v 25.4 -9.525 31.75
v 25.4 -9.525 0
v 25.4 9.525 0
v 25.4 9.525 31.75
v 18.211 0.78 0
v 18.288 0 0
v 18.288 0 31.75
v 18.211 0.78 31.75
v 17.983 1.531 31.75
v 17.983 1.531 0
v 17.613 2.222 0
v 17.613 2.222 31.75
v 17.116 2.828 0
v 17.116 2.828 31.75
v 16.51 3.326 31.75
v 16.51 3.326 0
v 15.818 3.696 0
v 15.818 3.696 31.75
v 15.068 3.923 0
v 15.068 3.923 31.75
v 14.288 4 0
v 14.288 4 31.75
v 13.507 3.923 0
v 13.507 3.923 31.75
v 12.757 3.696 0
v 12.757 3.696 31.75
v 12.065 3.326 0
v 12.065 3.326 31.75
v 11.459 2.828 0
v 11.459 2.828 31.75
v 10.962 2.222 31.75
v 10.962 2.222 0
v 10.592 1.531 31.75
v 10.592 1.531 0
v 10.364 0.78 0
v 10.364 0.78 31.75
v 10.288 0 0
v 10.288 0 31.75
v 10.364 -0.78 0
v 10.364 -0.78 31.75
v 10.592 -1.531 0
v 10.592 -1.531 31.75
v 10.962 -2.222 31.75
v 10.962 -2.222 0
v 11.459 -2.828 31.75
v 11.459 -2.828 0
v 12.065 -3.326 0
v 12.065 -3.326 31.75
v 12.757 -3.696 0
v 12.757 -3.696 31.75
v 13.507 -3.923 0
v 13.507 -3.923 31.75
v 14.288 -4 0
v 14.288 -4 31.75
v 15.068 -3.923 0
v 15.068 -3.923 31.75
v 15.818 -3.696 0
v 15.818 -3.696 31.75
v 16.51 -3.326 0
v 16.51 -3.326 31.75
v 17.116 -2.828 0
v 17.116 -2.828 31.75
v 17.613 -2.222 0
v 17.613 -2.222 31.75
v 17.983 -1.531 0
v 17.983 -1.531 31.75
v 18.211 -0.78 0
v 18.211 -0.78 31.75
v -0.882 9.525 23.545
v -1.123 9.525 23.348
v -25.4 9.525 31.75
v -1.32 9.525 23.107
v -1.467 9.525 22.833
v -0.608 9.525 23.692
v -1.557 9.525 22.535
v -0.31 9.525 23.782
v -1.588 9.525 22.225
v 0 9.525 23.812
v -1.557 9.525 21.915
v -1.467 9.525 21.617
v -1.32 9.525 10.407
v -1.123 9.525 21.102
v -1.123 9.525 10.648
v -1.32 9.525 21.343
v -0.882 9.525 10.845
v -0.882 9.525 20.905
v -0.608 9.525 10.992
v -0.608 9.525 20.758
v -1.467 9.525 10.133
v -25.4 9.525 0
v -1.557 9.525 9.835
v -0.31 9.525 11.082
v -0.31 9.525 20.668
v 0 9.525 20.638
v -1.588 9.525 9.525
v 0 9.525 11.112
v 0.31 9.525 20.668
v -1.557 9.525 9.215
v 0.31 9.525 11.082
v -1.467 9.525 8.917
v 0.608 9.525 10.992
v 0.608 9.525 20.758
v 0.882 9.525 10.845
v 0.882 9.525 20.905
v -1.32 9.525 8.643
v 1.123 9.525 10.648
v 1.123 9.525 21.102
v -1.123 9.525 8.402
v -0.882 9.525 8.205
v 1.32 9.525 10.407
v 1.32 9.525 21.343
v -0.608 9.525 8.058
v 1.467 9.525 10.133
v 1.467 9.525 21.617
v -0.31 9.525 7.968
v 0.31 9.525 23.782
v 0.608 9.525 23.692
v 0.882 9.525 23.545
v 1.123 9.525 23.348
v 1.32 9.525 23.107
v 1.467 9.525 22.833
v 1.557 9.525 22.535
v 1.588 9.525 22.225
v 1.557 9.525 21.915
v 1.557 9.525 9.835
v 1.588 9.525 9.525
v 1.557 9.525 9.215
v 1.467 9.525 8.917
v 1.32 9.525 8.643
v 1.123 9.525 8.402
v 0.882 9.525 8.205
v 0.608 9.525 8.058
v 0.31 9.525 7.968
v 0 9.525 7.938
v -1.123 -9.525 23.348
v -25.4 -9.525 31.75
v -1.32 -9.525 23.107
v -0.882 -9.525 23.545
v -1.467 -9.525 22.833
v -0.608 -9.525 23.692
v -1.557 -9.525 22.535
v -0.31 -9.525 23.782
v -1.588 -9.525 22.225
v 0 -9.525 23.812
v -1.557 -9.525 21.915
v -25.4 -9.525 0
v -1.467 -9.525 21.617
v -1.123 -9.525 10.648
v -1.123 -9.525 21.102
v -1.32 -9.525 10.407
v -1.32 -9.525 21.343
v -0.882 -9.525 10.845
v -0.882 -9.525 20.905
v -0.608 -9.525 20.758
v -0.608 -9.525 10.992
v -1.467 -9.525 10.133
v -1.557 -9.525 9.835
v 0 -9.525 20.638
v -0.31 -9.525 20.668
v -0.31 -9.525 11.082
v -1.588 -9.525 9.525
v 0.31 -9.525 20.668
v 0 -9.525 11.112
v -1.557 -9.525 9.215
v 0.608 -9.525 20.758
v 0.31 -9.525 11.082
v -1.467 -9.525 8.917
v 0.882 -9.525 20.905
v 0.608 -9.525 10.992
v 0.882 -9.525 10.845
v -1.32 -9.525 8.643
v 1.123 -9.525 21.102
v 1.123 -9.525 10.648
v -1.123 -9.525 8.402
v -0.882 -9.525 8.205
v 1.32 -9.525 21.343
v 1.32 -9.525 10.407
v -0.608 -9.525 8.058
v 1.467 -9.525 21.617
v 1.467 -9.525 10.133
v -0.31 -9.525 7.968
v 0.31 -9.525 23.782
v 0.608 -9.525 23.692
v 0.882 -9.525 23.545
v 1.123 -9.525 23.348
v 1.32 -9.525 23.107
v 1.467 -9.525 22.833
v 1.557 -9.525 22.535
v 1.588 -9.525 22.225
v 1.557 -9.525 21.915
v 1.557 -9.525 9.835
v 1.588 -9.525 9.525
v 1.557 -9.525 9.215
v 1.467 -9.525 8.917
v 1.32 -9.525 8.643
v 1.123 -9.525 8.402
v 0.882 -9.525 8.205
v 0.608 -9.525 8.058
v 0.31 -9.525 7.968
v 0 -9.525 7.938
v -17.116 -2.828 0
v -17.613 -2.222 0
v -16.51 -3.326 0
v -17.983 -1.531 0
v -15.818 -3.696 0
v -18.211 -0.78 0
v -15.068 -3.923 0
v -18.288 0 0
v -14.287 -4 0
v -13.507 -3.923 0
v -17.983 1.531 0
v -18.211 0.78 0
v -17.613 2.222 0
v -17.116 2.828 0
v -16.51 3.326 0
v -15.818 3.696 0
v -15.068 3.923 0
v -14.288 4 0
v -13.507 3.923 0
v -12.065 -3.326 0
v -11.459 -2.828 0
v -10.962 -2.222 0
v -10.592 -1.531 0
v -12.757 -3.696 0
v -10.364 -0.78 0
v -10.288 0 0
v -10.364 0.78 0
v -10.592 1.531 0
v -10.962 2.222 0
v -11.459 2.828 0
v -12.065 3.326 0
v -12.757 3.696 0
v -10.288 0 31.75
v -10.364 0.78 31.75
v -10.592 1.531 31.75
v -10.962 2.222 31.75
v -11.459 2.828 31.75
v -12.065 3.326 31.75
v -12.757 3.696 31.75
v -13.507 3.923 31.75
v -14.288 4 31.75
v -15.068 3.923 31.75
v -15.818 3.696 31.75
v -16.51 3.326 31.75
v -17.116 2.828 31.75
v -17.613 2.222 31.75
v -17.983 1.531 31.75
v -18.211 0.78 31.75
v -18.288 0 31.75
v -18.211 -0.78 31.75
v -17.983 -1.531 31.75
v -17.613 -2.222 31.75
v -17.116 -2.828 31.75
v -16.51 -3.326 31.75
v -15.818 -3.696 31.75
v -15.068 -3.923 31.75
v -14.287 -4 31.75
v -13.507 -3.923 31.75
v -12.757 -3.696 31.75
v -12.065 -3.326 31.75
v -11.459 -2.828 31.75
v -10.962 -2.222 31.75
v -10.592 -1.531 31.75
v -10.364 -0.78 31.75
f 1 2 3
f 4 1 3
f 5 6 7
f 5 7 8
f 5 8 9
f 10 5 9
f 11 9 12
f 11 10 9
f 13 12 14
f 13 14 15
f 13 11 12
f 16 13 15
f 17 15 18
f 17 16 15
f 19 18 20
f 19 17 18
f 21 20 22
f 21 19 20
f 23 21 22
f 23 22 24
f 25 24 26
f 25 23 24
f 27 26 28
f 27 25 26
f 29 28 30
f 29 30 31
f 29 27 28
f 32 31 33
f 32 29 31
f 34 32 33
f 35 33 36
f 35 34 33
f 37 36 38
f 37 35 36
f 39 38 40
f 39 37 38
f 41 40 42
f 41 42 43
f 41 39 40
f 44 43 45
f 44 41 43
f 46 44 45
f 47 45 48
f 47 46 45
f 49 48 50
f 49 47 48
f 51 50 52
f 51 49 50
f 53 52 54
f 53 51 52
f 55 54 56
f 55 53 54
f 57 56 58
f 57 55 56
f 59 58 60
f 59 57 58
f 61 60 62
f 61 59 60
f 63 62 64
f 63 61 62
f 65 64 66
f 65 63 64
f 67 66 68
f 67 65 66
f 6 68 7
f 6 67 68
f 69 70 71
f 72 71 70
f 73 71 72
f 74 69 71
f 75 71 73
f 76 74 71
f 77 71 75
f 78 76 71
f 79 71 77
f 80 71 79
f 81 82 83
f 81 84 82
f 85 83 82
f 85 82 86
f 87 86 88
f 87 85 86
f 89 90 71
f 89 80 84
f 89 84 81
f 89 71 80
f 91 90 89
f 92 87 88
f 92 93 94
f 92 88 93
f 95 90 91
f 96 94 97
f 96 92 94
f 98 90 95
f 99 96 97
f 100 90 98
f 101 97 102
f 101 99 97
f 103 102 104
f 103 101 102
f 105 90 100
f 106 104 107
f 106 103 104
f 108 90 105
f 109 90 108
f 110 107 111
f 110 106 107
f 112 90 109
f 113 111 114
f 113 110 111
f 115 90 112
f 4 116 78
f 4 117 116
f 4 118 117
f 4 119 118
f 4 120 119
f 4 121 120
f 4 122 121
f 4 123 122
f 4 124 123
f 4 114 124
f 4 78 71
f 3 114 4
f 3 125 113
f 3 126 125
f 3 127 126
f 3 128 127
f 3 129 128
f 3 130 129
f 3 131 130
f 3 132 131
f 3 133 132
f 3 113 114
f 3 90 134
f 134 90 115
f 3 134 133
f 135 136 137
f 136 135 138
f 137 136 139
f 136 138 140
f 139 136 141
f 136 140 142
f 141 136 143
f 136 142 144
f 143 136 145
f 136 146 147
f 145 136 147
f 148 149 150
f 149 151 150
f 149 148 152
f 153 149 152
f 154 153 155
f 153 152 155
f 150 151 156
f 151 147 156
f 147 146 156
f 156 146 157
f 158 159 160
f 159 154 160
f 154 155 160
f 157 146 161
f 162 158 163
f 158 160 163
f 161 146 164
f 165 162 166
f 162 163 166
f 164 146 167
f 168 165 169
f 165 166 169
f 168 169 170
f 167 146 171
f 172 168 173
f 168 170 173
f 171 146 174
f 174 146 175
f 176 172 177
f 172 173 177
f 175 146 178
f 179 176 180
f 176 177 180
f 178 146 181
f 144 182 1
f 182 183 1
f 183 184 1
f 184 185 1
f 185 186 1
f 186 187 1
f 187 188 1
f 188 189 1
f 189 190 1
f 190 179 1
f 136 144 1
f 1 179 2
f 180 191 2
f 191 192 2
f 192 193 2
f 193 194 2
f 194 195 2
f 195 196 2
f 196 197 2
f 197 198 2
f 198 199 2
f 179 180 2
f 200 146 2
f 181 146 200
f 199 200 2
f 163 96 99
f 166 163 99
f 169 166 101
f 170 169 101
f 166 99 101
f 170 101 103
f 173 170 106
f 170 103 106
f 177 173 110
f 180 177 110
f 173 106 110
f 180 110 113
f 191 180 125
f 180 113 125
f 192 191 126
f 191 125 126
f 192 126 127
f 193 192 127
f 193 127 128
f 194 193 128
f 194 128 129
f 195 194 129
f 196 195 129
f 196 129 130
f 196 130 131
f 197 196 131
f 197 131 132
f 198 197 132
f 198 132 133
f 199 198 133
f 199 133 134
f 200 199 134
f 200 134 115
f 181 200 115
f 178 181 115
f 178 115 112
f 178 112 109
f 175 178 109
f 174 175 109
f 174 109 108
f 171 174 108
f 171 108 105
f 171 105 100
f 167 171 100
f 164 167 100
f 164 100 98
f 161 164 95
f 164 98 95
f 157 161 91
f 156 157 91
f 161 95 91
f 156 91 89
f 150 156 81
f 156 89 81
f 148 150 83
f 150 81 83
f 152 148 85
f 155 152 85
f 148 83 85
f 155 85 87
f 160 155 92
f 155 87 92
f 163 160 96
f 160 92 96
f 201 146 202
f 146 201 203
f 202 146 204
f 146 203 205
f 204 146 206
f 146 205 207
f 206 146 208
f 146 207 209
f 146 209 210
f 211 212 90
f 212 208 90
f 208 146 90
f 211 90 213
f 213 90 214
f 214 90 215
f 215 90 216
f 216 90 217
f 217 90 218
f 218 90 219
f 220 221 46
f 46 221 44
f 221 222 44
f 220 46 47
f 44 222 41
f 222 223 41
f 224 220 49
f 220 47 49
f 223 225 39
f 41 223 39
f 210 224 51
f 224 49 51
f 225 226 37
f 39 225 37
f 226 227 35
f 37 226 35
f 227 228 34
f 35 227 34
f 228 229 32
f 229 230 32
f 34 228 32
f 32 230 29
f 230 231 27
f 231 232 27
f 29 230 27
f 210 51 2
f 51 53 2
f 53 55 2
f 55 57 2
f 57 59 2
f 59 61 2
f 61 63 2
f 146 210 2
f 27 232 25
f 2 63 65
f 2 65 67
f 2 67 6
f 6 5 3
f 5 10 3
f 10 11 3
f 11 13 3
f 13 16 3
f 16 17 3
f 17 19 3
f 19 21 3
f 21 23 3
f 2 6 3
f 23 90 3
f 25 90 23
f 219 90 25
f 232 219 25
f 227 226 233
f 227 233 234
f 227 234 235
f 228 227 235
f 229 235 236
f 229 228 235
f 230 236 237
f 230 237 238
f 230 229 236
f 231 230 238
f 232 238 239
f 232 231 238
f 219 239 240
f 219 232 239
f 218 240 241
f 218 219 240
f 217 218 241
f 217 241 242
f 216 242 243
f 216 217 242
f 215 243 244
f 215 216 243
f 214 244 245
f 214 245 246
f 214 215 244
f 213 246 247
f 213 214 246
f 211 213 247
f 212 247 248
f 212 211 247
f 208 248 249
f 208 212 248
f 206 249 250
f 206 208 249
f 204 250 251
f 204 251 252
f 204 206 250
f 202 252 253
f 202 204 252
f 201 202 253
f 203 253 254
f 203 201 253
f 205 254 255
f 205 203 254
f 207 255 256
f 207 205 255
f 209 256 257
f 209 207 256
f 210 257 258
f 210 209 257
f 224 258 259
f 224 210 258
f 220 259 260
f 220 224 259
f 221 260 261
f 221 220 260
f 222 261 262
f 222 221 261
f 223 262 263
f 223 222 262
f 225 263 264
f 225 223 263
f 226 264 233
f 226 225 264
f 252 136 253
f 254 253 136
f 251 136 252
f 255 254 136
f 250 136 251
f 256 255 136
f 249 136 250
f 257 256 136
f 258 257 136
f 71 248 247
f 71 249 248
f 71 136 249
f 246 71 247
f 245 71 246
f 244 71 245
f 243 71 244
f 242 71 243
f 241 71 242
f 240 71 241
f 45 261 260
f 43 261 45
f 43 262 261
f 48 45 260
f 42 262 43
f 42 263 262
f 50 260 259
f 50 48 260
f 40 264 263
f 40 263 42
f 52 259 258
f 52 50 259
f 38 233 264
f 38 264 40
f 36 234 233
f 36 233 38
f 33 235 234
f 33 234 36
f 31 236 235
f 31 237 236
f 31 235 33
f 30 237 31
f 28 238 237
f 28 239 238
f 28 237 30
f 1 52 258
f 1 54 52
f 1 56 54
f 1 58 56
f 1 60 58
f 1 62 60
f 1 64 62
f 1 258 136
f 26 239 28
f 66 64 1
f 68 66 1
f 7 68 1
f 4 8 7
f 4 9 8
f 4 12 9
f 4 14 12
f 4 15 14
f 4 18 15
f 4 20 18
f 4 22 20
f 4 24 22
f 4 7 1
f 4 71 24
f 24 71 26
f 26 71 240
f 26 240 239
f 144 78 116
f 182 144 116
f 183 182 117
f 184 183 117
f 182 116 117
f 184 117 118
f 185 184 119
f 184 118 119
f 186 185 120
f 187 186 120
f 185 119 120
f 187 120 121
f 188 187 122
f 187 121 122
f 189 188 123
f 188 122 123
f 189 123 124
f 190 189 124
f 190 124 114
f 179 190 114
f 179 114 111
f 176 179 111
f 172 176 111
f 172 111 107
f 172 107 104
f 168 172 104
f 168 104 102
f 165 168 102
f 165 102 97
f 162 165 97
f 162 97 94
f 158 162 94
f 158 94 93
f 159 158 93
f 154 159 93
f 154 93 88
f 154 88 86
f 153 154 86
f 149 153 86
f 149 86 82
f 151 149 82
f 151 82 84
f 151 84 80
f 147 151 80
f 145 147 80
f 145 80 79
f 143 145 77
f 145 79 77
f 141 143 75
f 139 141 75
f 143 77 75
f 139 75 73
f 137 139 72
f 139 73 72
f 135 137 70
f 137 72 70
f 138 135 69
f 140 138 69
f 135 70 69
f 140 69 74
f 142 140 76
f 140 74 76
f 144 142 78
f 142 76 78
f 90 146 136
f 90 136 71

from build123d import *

# Parameters (mm, degrees)
SKETCH1_W           = 50.8
SKETCH1_H           = 19.05
SKETCH1_R           = 4
BOSS_EXTRUDE1_DEPTH = 31.75
SKETCH2_R           = 1.5875
CUT_EXTRUDE1_DEPTH  = 45.901280605


with BuildPart() as part:
    # Sketch1 → Boss-Extrude1 (new body)
    with BuildSketch(Plane.XY):
        Rectangle(SKETCH1_W, SKETCH1_H)
        with Locations((-14.2875, 0)):
            Circle(SKETCH1_R, mode=Mode.SUBTRACT)
        with Locations((14.2875, 0)):
            Circle(SKETCH1_R, mode=Mode.SUBTRACT)
    extrude(amount=BOSS_EXTRUDE1_DEPTH)

    # Sketch2 → Cut-Extrude1 (cut, through all)
    with BuildSketch(Plane(origin=(0, 9.525, 0), x_dir=(1, 0, 0), z_dir=(0, 1, 0))):
        with Locations(Location((0, -9.525, 0), (0, 0, 270))):
            Circle(SKETCH2_R)
        with Locations(Location((0, -22.225, 0), (0, 0, 270))):
            Circle(SKETCH2_R)
    extrude(amount=-CUT_EXTRUDE1_DEPTH, mode=Mode.SUBTRACT)


solid = part.part
